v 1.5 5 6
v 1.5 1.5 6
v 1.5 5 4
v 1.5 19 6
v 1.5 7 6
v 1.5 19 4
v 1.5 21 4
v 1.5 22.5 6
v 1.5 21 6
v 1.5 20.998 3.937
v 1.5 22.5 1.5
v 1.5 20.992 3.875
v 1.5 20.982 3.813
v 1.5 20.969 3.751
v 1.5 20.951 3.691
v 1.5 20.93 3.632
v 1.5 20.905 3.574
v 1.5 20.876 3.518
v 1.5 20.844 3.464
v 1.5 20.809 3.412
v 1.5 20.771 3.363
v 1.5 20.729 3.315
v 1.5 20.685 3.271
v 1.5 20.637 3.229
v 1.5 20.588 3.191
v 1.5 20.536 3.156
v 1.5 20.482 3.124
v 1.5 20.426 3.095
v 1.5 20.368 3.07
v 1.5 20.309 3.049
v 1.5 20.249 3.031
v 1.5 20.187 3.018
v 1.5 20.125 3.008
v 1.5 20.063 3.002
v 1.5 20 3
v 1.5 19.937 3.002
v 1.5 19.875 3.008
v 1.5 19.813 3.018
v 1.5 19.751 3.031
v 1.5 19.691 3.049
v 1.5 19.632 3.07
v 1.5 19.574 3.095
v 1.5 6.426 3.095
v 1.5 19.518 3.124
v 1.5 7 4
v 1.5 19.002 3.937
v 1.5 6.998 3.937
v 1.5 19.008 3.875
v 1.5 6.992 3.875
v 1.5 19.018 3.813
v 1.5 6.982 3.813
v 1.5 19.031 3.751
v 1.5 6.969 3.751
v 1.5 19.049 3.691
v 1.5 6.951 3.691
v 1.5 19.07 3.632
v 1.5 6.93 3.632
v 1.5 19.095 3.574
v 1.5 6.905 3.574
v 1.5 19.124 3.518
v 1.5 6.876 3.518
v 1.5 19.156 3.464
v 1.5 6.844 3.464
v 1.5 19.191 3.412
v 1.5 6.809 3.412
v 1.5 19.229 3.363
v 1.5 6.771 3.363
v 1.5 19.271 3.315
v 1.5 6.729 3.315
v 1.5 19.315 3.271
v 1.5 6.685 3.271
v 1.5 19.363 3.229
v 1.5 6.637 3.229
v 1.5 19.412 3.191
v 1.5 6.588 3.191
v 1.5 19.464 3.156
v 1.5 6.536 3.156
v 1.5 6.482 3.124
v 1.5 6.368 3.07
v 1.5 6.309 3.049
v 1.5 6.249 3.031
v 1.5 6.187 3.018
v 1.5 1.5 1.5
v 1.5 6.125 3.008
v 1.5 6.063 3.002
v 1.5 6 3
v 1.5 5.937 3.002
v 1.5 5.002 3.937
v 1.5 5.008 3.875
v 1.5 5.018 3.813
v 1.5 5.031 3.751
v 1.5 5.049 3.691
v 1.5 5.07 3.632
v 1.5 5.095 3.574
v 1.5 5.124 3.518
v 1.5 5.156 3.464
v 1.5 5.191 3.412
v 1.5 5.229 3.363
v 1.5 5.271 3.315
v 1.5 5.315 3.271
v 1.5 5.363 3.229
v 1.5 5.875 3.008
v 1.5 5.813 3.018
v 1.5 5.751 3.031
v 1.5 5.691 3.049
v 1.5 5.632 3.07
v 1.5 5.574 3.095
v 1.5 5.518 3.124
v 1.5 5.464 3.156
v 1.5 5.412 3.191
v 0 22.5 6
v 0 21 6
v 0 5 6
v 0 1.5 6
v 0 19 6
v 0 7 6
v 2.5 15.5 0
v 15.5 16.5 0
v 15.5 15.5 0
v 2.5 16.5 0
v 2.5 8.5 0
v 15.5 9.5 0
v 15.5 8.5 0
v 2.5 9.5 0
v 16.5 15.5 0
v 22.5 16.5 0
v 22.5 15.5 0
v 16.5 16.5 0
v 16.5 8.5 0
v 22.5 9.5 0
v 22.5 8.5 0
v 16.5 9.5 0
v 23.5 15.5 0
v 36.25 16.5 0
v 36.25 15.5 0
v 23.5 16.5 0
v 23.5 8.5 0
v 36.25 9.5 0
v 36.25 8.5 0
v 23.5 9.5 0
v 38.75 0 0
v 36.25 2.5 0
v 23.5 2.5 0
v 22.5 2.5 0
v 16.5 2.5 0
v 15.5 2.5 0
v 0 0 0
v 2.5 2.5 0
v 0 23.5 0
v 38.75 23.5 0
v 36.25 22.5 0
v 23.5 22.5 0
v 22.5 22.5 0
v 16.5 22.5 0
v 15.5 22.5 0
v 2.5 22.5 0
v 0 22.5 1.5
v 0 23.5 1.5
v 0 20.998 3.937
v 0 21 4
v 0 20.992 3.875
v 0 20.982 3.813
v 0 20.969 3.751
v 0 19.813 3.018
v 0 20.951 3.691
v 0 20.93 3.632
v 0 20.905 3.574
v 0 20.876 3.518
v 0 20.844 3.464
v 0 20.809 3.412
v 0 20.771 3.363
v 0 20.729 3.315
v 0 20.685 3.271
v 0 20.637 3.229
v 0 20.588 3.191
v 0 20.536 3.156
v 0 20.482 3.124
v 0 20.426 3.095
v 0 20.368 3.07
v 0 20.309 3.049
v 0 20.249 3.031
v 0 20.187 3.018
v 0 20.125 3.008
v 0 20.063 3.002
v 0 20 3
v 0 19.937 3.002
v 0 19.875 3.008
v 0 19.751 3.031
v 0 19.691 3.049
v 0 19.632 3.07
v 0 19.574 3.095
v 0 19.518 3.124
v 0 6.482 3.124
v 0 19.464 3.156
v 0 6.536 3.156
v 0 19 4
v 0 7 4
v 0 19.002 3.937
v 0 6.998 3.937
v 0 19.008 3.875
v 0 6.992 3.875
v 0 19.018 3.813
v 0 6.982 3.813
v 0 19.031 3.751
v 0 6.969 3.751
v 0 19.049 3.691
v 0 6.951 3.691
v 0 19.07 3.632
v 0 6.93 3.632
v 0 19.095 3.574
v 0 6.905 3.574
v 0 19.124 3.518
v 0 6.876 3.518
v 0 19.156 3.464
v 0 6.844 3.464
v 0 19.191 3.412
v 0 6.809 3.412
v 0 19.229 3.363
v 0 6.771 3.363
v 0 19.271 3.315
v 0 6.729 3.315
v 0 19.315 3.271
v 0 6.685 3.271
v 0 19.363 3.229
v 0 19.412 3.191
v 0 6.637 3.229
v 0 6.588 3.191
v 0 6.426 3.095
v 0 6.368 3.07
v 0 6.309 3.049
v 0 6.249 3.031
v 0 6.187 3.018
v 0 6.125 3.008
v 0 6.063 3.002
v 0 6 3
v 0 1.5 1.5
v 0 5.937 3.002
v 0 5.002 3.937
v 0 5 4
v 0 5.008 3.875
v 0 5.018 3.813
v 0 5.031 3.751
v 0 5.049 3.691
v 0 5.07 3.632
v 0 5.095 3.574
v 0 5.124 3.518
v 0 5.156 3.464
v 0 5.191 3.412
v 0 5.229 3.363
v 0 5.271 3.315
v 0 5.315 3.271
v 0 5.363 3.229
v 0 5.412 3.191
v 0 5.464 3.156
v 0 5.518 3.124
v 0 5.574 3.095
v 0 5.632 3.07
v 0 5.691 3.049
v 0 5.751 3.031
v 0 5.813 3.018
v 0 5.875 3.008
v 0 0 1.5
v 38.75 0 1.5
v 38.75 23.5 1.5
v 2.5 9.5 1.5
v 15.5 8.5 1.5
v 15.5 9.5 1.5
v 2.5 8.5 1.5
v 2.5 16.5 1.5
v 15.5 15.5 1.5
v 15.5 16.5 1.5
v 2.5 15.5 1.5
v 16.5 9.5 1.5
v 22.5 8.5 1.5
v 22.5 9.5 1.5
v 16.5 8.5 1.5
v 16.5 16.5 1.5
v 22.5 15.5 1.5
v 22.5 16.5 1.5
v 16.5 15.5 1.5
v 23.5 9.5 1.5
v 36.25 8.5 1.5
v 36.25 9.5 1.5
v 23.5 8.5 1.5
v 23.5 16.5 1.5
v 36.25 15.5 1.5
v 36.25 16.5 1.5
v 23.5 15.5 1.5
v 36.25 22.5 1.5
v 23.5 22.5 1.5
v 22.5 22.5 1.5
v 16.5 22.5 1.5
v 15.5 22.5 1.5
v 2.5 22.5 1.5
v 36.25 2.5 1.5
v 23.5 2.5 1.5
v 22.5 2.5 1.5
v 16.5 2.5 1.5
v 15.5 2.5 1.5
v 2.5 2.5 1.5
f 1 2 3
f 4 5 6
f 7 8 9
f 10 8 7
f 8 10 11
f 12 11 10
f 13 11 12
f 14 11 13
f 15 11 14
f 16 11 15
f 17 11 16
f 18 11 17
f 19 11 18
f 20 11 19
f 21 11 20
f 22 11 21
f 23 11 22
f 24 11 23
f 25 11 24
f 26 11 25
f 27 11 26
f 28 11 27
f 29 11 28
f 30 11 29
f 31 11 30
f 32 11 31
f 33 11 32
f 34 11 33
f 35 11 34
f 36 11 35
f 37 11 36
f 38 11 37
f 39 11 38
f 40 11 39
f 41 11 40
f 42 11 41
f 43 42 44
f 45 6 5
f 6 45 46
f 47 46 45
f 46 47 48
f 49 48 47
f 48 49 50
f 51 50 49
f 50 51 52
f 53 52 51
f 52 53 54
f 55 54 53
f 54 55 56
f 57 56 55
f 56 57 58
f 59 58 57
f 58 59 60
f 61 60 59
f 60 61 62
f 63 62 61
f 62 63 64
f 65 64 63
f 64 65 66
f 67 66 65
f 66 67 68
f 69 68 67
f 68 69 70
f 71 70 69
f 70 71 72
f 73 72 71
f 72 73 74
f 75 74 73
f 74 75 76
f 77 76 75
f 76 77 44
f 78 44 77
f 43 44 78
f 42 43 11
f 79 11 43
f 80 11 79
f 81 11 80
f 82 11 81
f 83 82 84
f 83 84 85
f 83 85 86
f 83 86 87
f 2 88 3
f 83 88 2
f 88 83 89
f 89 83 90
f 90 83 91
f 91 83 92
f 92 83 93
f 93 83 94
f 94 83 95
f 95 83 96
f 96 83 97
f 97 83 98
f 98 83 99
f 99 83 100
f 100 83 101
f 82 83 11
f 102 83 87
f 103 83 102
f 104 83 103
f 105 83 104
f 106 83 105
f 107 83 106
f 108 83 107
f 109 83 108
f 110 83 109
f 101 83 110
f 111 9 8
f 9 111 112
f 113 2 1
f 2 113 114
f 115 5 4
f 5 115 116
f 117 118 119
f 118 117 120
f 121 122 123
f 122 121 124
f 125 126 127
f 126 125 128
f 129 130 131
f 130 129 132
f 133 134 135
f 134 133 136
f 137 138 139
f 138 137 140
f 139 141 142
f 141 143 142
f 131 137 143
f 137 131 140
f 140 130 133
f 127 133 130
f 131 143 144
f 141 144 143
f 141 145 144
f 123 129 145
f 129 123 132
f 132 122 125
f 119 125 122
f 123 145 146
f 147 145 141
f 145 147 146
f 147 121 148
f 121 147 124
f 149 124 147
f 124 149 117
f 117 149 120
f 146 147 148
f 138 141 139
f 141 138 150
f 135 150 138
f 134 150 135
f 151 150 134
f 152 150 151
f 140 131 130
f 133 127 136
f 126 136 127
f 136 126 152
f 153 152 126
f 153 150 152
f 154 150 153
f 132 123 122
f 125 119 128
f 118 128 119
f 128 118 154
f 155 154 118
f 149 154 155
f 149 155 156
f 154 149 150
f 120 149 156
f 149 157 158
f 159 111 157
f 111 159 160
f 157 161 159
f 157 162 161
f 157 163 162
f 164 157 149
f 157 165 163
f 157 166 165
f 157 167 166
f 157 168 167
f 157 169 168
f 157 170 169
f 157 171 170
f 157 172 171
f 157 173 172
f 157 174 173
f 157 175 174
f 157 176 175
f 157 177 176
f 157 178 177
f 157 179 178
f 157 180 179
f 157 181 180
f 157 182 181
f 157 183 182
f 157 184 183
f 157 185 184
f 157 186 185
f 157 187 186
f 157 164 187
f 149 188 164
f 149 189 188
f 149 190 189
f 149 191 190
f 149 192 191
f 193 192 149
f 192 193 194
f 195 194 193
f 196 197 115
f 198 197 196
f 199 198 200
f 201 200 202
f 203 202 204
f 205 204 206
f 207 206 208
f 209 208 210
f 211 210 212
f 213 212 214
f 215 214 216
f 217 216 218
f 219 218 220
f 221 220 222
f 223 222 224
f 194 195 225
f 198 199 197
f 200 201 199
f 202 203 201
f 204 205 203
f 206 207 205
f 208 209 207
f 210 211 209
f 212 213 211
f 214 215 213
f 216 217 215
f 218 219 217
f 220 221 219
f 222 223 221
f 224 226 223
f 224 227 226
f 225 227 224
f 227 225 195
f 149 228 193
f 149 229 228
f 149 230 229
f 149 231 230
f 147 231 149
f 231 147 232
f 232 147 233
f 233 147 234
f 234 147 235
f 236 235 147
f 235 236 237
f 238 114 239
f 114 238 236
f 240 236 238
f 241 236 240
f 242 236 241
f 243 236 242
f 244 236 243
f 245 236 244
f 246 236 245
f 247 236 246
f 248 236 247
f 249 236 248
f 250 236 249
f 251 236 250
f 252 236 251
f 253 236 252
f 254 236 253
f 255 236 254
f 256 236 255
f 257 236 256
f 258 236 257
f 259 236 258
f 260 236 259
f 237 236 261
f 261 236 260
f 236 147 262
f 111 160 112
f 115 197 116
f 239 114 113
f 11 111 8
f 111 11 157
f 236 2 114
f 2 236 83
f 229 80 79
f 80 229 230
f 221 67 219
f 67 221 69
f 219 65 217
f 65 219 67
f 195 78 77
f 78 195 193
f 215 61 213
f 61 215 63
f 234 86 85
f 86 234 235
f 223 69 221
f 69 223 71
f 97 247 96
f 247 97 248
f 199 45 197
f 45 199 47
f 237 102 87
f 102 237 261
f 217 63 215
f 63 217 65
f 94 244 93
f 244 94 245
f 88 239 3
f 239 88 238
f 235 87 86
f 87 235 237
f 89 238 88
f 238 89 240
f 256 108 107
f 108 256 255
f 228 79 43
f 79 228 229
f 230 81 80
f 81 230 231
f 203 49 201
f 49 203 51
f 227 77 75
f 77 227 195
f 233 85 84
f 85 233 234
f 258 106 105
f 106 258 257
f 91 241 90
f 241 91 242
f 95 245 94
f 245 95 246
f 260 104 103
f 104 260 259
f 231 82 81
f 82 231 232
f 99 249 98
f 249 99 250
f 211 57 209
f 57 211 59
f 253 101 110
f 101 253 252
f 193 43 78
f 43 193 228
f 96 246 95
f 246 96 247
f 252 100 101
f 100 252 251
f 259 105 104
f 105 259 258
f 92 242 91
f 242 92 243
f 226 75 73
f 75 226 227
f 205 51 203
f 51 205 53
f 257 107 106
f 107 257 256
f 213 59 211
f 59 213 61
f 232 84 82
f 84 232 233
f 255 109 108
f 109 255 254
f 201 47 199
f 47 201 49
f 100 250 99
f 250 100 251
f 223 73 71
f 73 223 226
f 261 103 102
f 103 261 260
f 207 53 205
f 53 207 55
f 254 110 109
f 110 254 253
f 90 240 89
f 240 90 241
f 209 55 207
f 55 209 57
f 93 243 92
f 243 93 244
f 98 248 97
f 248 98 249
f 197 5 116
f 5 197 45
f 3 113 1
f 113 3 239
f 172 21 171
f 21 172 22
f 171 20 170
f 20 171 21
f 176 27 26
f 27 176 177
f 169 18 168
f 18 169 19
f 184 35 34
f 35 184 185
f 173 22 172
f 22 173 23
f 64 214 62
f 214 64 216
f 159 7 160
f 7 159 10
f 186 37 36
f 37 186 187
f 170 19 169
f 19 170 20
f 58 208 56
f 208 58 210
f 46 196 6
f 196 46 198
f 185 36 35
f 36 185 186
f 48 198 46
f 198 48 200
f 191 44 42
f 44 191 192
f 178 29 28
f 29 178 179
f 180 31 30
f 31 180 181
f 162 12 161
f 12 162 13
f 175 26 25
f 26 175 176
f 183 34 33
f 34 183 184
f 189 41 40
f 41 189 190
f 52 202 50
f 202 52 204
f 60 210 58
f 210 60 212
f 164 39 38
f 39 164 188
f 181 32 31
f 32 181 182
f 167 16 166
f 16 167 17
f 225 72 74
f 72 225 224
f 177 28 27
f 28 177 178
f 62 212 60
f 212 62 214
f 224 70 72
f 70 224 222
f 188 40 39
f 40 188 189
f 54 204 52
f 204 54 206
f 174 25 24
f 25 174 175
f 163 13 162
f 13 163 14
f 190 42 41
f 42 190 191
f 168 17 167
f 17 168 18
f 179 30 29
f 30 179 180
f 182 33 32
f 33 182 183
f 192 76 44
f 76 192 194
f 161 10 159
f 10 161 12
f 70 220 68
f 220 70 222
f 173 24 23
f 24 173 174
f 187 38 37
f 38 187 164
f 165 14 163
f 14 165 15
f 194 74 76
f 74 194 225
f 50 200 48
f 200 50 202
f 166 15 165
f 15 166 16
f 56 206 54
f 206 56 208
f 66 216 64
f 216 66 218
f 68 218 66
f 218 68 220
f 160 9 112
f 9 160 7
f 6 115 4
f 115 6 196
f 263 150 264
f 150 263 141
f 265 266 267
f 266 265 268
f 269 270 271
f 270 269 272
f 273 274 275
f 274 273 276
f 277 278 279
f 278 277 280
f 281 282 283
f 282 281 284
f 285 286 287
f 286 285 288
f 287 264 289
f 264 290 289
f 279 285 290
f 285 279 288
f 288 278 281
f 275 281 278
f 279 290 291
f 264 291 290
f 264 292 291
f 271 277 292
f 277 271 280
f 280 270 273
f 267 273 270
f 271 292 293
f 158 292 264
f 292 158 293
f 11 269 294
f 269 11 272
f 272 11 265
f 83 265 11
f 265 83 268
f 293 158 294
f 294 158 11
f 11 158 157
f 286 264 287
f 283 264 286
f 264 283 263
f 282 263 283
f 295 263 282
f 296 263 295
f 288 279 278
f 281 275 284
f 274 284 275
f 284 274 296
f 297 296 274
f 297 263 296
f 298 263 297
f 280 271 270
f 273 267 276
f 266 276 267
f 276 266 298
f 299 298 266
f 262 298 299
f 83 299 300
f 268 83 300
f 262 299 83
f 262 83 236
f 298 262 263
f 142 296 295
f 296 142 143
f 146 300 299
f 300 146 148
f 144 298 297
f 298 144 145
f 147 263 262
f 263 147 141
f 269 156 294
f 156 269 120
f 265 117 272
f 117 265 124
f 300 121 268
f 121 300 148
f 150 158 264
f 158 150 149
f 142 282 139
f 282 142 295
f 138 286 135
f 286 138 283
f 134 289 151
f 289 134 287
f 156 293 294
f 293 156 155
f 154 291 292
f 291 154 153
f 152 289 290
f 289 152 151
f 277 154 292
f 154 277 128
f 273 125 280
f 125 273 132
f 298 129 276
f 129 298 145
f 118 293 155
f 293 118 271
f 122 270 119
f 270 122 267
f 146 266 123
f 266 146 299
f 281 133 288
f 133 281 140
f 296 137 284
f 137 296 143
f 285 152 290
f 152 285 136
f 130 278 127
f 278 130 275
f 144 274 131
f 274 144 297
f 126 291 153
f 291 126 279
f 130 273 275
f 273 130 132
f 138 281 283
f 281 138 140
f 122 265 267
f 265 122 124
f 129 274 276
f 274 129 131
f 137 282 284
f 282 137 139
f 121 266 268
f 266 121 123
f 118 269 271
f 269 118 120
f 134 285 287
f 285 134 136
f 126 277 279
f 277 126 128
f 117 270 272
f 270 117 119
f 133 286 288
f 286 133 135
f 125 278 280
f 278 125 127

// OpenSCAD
/* [Dimensions] */
width = 38.75; // [0:0.25:50]
height = 23.5; // [0:0.25:40]
depth = 1.5; // [0:0.25:3]

frame_thickness = 2.5; // [0:0.25:5]

mesh_thickness = 1; // [0:0.25:4]

hole_thickness = 2; // [0:0.25:4]

$fn = $preview ? 8 : 100;

// frame
cube([width,frame_thickness,depth]);

cube([frame_thickness,height,depth]);

translate([width-frame_thickness,0,0])
    cube([frame_thickness,height,depth]);

translate([0,height-1,0])
    cube([width,1,depth]);

// mesh
translate([frame_thickness+13,0,0])
    cube([mesh_thickness,height,depth]);

translate([frame_thickness+13+mesh_thickness+6,0,0])
    cube([mesh_thickness,height,depth]);

translate([0,frame_thickness+6,0])
    cube([width,mesh_thickness,depth]);

translate([0,frame_thickness+6+mesh_thickness+6,0])
    cube([width,mesh_thickness,depth]);

// clip
difference() {
    translate([0,1.5,0])
        cube([1.5,21,6]);

    // hole 1
    translate([-1,6,4])
        rotate([0,90,0])
            cylinder(d=hole_thickness , h=3);

    translate([-1,6-hole_thickness/2,4])
        cube([3,hole_thickness,10]);

    // hole 2
    translate([-1,20,4])
        rotate([0,90,0])
            cylinder(d=hole_thickness , h=3);

    translate([-1,20-hole_thickness/2,4])
        cube([3,hole_thickness,10]);
}
